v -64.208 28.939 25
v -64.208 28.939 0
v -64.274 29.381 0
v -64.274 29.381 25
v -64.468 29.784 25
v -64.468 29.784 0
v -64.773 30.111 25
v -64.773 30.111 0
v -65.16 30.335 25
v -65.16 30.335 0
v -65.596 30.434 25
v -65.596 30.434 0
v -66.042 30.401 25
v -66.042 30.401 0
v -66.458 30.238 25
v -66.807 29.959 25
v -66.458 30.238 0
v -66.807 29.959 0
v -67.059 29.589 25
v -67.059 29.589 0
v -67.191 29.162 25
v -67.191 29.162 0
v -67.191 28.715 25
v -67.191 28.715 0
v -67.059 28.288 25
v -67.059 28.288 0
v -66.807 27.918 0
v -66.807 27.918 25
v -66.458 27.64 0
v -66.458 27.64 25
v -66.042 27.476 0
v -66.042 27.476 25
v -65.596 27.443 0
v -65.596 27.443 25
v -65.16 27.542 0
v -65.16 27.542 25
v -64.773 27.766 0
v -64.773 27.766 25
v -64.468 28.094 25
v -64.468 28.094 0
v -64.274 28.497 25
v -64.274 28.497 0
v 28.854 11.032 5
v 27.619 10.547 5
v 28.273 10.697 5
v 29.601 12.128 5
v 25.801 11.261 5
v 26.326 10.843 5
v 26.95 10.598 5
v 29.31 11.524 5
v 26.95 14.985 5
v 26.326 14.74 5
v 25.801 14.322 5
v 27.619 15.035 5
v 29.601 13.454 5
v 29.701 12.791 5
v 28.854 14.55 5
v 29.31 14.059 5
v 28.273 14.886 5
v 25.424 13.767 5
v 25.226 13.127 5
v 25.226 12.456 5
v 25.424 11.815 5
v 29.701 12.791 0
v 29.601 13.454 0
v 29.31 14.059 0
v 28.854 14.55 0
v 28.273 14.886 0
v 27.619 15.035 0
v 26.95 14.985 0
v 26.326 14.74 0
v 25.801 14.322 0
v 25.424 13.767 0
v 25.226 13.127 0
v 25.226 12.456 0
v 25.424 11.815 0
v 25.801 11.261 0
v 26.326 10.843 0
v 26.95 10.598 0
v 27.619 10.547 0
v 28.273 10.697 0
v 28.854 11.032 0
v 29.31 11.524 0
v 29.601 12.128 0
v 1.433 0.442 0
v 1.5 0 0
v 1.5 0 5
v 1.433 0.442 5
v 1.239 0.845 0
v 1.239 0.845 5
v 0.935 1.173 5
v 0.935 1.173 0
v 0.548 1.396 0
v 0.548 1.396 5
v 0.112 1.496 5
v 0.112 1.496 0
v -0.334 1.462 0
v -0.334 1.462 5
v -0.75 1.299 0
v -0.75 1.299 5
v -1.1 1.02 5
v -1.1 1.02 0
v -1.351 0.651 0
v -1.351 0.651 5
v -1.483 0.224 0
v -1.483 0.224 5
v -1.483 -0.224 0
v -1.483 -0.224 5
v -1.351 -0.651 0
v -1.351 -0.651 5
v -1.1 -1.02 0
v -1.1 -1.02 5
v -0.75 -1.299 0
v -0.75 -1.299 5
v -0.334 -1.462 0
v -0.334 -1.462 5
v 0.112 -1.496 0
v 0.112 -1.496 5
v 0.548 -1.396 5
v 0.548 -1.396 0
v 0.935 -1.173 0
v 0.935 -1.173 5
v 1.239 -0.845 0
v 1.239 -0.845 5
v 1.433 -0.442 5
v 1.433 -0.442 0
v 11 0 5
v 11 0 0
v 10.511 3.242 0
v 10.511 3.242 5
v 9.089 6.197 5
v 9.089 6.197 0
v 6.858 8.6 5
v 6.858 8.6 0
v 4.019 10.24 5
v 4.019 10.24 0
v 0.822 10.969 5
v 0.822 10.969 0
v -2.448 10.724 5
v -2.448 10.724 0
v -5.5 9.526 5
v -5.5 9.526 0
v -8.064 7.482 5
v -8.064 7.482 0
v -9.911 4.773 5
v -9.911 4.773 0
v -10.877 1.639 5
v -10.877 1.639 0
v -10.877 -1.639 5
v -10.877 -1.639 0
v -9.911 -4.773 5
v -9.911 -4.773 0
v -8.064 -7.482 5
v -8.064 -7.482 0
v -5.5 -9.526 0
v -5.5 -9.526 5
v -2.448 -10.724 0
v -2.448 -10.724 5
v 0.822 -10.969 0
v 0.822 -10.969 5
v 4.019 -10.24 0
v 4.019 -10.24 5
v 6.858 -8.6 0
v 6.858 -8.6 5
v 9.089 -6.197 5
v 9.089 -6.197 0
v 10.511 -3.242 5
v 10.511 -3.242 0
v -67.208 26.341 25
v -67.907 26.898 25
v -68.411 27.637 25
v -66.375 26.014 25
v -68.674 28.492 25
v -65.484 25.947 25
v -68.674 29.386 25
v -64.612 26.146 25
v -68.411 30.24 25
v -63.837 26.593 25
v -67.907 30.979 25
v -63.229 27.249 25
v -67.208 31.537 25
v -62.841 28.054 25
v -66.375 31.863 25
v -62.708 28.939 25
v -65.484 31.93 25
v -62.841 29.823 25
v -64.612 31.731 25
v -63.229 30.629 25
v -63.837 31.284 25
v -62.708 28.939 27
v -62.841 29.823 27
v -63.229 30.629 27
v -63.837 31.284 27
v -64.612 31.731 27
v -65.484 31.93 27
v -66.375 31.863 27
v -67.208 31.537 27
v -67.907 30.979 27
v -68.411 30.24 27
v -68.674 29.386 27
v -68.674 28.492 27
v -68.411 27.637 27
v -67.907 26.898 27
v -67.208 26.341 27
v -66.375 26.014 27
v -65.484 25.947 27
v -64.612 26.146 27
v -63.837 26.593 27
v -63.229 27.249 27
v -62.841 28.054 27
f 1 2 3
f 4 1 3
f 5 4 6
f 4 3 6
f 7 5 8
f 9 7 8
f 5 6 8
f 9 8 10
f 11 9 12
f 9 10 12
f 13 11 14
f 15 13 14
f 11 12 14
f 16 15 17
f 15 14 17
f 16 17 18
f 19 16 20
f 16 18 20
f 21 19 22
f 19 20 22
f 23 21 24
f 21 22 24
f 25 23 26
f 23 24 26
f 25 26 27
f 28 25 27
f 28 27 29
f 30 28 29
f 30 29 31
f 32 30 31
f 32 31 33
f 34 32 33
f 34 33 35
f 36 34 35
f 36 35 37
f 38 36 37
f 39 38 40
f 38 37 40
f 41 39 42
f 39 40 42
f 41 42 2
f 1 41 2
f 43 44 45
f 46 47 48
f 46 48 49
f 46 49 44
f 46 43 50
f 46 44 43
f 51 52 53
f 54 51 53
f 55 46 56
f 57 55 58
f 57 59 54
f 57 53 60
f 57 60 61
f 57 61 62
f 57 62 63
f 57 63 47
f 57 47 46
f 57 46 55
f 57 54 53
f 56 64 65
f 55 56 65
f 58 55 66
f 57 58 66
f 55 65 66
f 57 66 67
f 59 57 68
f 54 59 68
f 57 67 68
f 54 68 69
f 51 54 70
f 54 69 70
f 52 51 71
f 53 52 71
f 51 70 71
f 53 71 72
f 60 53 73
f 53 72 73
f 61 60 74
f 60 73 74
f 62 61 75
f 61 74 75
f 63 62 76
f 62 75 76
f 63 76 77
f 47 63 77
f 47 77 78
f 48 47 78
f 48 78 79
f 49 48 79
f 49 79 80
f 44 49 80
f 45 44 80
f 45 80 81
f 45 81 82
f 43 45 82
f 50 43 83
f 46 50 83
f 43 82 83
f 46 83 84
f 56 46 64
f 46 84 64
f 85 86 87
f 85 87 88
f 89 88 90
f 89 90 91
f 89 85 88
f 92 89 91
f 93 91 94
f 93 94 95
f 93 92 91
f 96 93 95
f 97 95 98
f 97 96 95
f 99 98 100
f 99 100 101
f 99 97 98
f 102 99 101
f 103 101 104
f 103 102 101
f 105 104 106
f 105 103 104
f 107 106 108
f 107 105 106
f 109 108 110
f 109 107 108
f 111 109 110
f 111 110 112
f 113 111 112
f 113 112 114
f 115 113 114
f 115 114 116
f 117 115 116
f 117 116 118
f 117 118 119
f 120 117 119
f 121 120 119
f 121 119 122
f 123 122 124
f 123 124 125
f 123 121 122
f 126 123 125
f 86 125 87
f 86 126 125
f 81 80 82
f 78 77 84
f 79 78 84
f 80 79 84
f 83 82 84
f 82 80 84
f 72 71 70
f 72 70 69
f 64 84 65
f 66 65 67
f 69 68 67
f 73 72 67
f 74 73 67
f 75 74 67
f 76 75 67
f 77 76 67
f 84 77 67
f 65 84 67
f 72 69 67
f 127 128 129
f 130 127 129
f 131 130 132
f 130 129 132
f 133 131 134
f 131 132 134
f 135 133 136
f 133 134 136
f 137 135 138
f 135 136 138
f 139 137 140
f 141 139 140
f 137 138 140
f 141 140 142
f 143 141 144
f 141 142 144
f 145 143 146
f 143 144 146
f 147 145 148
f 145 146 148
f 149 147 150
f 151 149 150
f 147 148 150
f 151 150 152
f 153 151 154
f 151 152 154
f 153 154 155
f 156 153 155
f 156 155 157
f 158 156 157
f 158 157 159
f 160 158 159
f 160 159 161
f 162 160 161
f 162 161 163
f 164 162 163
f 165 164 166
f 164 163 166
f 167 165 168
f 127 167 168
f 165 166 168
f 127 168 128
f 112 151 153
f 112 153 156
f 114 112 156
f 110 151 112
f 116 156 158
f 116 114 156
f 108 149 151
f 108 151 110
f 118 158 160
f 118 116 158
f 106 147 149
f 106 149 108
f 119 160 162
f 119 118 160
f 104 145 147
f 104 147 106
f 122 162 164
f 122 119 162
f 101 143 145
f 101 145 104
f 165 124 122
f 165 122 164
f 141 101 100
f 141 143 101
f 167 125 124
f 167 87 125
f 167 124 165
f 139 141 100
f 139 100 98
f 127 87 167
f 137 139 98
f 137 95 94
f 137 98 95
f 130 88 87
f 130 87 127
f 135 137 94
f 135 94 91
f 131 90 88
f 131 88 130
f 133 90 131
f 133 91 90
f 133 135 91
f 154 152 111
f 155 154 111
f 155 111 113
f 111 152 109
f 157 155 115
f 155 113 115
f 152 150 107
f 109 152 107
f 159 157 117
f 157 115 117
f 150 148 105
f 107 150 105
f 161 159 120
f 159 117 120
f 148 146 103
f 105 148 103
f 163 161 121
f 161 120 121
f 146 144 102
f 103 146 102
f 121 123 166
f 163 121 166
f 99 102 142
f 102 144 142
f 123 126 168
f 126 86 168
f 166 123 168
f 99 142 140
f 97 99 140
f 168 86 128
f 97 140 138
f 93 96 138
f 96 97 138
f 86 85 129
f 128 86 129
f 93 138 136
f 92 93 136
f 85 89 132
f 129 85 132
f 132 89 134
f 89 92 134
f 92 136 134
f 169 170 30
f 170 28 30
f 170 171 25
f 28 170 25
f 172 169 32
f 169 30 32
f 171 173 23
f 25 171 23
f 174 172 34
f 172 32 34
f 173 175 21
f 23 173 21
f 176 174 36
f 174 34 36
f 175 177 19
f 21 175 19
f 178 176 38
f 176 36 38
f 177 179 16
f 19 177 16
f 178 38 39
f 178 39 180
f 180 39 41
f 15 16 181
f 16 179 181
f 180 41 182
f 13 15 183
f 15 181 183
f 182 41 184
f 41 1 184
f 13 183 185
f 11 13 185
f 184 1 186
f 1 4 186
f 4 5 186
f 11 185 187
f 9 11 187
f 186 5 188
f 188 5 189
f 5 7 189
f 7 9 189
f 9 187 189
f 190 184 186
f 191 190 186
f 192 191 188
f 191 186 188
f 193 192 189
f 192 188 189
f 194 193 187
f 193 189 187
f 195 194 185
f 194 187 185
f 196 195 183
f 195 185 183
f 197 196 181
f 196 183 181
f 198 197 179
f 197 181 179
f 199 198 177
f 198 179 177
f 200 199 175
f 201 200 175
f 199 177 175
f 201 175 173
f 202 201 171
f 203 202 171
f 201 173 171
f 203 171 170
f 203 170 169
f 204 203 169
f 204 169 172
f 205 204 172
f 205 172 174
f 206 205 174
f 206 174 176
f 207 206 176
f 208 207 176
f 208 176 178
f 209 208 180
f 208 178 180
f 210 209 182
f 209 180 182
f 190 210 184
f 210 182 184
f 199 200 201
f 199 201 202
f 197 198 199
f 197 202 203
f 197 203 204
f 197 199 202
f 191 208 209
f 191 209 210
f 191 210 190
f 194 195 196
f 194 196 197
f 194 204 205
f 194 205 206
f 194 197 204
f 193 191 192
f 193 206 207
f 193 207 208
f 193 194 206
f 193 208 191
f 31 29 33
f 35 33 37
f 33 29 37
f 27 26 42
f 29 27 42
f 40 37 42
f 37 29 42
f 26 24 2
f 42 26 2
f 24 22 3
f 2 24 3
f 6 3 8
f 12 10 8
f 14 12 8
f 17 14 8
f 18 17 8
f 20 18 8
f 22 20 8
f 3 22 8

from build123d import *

# Parameters (mm, degrees)
F0_R     = 11
F0_R_2   = 1.5
F0_R_3   = 2.25
F1_DEPTH = 5
F2_DEPTH = 25
F3_R     = 3
F3_R_2   = 1.5
F4_DEPTH = 2


with BuildPart() as f1:
    # F0 (on Top) → F1 (new body)
    with BuildSketch(Plane.XY):
        Circle(F0_R)
        Circle(F0_R_2, mode=Mode.SUBTRACT)
        with Locations((27.450711, 12.791183)):
            Circle(F0_R_3)
    extrude(amount=F1_DEPTH)


with BuildPart() as f2:
    # F0 (on Top) → F2 (new body)
    with BuildSketch(Plane.XY):
        with Locations((-65.70781, 28.93866)):
            Circle(F0_R_2)
    extrude(amount=F2_DEPTH)

    # F3 (on face) → F4 (join)
    with BuildSketch(Plane.XY.offset(25)):
        with Locations((-65.70781, 28.93866)):
            Circle(F3_R)
        with Locations((-65.70781, 28.93866)):
            Circle(F3_R_2, mode=Mode.SUBTRACT)
        with Locations((-65.70781, 28.93866)):
            Circle(F3_R_2)
    extrude(amount=F4_DEPTH)


solid = Compound([f1.part, f2.part])
